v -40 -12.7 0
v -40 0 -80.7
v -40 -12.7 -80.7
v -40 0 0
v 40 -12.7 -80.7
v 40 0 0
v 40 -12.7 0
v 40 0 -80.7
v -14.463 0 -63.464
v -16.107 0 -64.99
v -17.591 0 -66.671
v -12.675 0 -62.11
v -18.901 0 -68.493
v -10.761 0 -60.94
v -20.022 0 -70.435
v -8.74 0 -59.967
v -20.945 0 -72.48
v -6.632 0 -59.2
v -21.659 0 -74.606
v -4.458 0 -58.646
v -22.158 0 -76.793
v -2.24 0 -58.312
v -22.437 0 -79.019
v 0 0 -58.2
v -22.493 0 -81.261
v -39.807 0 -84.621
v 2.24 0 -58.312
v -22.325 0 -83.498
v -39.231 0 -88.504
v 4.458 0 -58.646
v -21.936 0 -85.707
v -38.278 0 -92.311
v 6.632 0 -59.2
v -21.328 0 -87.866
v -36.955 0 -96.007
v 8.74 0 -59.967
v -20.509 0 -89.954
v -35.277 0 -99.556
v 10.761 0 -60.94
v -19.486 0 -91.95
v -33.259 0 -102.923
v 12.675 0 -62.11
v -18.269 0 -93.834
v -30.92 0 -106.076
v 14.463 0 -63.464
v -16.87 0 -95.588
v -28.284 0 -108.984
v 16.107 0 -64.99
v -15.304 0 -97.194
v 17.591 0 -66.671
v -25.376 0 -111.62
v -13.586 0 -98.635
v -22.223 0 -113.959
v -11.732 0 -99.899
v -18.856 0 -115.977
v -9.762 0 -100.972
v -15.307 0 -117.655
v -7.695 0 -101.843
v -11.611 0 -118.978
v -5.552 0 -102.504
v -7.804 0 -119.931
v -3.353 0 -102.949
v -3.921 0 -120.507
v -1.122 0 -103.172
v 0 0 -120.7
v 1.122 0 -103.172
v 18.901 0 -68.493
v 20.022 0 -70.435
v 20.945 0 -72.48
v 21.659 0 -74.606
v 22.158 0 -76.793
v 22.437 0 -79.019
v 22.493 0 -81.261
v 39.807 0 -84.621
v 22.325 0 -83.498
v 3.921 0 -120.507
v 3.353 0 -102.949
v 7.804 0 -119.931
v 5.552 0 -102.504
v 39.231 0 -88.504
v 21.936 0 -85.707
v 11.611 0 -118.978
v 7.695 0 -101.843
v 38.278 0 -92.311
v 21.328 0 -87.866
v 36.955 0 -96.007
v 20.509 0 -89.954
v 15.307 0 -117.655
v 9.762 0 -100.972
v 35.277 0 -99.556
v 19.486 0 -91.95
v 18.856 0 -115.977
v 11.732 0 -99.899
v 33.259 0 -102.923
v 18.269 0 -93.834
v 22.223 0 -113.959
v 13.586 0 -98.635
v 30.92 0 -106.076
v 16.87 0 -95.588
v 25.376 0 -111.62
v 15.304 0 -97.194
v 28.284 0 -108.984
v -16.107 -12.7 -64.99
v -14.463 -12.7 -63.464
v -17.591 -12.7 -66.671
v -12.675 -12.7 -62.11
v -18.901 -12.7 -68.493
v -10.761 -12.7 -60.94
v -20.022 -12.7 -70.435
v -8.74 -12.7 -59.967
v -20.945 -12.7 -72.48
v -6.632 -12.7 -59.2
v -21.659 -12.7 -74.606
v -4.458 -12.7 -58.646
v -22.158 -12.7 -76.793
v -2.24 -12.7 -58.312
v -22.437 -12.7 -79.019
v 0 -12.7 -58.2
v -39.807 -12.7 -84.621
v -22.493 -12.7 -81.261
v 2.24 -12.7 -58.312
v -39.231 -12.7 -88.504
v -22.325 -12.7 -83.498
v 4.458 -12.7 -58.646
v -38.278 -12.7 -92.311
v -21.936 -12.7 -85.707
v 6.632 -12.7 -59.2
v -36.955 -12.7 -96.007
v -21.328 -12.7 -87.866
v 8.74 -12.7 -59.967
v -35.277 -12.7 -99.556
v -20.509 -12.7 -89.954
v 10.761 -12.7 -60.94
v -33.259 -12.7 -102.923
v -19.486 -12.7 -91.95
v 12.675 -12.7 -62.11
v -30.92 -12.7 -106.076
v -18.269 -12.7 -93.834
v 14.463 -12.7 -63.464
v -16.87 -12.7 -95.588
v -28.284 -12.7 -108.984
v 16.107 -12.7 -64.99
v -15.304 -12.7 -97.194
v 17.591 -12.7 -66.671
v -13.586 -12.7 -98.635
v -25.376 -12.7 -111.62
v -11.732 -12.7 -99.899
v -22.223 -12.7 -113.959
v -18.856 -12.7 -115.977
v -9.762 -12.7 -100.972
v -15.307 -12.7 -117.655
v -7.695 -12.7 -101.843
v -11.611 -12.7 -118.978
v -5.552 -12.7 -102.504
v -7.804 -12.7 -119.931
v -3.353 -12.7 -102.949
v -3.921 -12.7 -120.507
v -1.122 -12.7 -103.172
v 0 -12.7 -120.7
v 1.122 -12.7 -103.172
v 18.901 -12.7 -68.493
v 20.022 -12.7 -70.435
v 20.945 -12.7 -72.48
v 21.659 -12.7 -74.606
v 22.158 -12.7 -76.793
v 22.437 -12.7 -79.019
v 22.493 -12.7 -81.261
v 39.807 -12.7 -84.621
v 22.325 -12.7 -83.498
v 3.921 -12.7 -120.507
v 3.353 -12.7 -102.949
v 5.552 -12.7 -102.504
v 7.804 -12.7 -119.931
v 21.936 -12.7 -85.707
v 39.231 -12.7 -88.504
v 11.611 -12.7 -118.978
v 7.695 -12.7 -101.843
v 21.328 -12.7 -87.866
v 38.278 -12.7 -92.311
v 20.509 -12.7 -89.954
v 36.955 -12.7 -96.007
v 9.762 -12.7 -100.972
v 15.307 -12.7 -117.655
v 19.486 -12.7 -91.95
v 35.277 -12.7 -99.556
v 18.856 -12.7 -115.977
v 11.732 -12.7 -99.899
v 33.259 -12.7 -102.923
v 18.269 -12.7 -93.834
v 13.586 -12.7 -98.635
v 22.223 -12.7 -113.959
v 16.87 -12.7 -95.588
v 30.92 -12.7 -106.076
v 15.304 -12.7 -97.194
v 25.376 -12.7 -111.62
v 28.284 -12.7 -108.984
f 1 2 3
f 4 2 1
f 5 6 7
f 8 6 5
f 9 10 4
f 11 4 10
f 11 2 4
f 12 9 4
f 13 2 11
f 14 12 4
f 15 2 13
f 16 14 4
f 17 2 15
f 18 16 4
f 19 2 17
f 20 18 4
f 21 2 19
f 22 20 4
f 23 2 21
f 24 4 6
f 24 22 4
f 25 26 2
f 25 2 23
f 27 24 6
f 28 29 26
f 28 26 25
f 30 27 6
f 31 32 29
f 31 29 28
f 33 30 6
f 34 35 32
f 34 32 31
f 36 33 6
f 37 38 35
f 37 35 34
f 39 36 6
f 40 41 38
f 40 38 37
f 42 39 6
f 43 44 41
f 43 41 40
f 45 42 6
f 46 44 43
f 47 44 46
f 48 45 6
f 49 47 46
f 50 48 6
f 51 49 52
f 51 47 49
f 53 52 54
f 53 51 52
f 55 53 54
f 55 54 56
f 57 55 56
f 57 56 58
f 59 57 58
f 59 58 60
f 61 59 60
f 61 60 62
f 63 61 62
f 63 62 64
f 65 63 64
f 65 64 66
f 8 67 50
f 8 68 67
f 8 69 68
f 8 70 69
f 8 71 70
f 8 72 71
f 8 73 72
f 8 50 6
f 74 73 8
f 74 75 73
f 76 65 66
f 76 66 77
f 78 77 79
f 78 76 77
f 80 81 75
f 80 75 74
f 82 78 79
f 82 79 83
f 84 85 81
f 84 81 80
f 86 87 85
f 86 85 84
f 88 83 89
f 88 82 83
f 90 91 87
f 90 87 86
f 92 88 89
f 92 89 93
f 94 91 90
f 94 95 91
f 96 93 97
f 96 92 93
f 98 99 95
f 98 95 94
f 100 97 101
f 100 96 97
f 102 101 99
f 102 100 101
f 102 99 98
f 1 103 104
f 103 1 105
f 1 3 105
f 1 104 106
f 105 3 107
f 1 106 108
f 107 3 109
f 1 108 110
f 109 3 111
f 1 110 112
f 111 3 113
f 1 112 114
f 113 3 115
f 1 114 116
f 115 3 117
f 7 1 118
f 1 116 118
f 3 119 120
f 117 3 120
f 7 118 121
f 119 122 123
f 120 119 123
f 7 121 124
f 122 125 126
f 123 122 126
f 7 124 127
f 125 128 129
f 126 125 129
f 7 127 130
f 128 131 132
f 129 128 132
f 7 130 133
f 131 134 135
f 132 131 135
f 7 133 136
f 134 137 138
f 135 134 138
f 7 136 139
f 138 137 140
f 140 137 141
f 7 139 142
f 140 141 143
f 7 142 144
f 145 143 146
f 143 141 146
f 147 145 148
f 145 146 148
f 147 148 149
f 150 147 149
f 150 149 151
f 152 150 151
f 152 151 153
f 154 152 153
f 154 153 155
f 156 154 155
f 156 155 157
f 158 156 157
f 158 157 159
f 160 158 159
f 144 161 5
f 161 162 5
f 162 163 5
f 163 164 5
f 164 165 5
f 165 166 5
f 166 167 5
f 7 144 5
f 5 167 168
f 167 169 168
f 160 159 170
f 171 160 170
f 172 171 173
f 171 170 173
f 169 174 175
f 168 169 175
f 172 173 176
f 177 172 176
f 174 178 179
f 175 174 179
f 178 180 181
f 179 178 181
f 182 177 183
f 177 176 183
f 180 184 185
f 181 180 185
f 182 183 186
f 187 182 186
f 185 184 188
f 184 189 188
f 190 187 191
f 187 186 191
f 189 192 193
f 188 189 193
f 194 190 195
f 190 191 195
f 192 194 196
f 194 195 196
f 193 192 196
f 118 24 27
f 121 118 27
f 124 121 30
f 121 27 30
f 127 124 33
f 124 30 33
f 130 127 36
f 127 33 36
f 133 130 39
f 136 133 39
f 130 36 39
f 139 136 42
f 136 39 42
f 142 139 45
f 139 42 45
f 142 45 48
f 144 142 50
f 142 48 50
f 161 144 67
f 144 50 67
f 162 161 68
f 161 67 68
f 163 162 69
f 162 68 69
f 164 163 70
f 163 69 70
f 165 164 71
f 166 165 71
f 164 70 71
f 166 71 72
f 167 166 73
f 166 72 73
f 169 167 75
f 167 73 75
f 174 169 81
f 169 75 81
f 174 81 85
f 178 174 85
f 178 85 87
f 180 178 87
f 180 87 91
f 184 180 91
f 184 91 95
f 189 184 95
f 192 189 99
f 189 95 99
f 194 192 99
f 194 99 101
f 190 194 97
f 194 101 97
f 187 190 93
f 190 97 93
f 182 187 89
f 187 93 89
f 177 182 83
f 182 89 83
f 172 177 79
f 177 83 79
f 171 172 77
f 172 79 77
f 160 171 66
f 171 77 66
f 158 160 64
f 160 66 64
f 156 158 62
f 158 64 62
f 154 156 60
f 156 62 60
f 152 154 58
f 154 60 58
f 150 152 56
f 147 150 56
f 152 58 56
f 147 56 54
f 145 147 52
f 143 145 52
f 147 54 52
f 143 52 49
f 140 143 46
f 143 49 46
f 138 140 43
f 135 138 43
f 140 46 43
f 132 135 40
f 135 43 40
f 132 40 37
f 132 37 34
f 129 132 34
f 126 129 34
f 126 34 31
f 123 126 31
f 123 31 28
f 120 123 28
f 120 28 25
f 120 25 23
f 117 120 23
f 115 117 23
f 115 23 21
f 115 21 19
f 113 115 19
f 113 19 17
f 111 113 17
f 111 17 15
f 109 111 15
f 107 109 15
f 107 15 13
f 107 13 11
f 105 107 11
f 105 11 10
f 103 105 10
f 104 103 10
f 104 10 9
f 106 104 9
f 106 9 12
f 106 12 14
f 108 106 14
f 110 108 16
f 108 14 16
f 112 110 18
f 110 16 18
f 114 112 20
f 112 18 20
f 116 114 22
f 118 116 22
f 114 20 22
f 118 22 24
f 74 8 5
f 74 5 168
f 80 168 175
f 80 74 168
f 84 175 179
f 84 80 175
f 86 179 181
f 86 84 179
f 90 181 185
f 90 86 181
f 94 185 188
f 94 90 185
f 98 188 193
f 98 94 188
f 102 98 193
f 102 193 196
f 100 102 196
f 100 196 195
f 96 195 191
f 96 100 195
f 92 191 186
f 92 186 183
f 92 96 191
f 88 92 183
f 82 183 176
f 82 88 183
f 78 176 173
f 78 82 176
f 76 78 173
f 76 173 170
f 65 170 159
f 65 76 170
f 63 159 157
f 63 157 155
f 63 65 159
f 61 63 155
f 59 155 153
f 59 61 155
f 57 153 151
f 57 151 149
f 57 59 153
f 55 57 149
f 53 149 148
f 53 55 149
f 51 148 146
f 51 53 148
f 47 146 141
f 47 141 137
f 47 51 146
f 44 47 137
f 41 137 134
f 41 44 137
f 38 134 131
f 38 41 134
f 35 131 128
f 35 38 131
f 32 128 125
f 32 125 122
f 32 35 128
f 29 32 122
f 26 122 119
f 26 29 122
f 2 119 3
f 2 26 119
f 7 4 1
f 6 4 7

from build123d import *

# Parameters (mm, degrees)
ESBO_O1_R          = 22.5
FLANGE_BASE1_DEPTH = 12.7


# Sheet-metal steps are written as plain solids
with BuildPart() as part:
    # Esboço1 → Flange-base1 (new body)
    with BuildSketch(Plane(origin=(0, 0, 0), x_dir=(1, 0, 0), z_dir=(0, 1, 0))):
        with BuildLine():
            Line((-40, 0), (40, 0))
            Line((40, 0), (40, 80.7))
            ThreePointArc((40, 80.7), (0, 120.7), (-40, 80.7))
            Line((-40, 80.7), (-40, 0))
        make_face()
        with Locations(Location((0, 80.7, 0), (0, 0, 270))):
            Circle(ESBO_O1_R, mode=Mode.SUBTRACT)
    extrude(amount=-FLANGE_BASE1_DEPTH)


solid = part.part
